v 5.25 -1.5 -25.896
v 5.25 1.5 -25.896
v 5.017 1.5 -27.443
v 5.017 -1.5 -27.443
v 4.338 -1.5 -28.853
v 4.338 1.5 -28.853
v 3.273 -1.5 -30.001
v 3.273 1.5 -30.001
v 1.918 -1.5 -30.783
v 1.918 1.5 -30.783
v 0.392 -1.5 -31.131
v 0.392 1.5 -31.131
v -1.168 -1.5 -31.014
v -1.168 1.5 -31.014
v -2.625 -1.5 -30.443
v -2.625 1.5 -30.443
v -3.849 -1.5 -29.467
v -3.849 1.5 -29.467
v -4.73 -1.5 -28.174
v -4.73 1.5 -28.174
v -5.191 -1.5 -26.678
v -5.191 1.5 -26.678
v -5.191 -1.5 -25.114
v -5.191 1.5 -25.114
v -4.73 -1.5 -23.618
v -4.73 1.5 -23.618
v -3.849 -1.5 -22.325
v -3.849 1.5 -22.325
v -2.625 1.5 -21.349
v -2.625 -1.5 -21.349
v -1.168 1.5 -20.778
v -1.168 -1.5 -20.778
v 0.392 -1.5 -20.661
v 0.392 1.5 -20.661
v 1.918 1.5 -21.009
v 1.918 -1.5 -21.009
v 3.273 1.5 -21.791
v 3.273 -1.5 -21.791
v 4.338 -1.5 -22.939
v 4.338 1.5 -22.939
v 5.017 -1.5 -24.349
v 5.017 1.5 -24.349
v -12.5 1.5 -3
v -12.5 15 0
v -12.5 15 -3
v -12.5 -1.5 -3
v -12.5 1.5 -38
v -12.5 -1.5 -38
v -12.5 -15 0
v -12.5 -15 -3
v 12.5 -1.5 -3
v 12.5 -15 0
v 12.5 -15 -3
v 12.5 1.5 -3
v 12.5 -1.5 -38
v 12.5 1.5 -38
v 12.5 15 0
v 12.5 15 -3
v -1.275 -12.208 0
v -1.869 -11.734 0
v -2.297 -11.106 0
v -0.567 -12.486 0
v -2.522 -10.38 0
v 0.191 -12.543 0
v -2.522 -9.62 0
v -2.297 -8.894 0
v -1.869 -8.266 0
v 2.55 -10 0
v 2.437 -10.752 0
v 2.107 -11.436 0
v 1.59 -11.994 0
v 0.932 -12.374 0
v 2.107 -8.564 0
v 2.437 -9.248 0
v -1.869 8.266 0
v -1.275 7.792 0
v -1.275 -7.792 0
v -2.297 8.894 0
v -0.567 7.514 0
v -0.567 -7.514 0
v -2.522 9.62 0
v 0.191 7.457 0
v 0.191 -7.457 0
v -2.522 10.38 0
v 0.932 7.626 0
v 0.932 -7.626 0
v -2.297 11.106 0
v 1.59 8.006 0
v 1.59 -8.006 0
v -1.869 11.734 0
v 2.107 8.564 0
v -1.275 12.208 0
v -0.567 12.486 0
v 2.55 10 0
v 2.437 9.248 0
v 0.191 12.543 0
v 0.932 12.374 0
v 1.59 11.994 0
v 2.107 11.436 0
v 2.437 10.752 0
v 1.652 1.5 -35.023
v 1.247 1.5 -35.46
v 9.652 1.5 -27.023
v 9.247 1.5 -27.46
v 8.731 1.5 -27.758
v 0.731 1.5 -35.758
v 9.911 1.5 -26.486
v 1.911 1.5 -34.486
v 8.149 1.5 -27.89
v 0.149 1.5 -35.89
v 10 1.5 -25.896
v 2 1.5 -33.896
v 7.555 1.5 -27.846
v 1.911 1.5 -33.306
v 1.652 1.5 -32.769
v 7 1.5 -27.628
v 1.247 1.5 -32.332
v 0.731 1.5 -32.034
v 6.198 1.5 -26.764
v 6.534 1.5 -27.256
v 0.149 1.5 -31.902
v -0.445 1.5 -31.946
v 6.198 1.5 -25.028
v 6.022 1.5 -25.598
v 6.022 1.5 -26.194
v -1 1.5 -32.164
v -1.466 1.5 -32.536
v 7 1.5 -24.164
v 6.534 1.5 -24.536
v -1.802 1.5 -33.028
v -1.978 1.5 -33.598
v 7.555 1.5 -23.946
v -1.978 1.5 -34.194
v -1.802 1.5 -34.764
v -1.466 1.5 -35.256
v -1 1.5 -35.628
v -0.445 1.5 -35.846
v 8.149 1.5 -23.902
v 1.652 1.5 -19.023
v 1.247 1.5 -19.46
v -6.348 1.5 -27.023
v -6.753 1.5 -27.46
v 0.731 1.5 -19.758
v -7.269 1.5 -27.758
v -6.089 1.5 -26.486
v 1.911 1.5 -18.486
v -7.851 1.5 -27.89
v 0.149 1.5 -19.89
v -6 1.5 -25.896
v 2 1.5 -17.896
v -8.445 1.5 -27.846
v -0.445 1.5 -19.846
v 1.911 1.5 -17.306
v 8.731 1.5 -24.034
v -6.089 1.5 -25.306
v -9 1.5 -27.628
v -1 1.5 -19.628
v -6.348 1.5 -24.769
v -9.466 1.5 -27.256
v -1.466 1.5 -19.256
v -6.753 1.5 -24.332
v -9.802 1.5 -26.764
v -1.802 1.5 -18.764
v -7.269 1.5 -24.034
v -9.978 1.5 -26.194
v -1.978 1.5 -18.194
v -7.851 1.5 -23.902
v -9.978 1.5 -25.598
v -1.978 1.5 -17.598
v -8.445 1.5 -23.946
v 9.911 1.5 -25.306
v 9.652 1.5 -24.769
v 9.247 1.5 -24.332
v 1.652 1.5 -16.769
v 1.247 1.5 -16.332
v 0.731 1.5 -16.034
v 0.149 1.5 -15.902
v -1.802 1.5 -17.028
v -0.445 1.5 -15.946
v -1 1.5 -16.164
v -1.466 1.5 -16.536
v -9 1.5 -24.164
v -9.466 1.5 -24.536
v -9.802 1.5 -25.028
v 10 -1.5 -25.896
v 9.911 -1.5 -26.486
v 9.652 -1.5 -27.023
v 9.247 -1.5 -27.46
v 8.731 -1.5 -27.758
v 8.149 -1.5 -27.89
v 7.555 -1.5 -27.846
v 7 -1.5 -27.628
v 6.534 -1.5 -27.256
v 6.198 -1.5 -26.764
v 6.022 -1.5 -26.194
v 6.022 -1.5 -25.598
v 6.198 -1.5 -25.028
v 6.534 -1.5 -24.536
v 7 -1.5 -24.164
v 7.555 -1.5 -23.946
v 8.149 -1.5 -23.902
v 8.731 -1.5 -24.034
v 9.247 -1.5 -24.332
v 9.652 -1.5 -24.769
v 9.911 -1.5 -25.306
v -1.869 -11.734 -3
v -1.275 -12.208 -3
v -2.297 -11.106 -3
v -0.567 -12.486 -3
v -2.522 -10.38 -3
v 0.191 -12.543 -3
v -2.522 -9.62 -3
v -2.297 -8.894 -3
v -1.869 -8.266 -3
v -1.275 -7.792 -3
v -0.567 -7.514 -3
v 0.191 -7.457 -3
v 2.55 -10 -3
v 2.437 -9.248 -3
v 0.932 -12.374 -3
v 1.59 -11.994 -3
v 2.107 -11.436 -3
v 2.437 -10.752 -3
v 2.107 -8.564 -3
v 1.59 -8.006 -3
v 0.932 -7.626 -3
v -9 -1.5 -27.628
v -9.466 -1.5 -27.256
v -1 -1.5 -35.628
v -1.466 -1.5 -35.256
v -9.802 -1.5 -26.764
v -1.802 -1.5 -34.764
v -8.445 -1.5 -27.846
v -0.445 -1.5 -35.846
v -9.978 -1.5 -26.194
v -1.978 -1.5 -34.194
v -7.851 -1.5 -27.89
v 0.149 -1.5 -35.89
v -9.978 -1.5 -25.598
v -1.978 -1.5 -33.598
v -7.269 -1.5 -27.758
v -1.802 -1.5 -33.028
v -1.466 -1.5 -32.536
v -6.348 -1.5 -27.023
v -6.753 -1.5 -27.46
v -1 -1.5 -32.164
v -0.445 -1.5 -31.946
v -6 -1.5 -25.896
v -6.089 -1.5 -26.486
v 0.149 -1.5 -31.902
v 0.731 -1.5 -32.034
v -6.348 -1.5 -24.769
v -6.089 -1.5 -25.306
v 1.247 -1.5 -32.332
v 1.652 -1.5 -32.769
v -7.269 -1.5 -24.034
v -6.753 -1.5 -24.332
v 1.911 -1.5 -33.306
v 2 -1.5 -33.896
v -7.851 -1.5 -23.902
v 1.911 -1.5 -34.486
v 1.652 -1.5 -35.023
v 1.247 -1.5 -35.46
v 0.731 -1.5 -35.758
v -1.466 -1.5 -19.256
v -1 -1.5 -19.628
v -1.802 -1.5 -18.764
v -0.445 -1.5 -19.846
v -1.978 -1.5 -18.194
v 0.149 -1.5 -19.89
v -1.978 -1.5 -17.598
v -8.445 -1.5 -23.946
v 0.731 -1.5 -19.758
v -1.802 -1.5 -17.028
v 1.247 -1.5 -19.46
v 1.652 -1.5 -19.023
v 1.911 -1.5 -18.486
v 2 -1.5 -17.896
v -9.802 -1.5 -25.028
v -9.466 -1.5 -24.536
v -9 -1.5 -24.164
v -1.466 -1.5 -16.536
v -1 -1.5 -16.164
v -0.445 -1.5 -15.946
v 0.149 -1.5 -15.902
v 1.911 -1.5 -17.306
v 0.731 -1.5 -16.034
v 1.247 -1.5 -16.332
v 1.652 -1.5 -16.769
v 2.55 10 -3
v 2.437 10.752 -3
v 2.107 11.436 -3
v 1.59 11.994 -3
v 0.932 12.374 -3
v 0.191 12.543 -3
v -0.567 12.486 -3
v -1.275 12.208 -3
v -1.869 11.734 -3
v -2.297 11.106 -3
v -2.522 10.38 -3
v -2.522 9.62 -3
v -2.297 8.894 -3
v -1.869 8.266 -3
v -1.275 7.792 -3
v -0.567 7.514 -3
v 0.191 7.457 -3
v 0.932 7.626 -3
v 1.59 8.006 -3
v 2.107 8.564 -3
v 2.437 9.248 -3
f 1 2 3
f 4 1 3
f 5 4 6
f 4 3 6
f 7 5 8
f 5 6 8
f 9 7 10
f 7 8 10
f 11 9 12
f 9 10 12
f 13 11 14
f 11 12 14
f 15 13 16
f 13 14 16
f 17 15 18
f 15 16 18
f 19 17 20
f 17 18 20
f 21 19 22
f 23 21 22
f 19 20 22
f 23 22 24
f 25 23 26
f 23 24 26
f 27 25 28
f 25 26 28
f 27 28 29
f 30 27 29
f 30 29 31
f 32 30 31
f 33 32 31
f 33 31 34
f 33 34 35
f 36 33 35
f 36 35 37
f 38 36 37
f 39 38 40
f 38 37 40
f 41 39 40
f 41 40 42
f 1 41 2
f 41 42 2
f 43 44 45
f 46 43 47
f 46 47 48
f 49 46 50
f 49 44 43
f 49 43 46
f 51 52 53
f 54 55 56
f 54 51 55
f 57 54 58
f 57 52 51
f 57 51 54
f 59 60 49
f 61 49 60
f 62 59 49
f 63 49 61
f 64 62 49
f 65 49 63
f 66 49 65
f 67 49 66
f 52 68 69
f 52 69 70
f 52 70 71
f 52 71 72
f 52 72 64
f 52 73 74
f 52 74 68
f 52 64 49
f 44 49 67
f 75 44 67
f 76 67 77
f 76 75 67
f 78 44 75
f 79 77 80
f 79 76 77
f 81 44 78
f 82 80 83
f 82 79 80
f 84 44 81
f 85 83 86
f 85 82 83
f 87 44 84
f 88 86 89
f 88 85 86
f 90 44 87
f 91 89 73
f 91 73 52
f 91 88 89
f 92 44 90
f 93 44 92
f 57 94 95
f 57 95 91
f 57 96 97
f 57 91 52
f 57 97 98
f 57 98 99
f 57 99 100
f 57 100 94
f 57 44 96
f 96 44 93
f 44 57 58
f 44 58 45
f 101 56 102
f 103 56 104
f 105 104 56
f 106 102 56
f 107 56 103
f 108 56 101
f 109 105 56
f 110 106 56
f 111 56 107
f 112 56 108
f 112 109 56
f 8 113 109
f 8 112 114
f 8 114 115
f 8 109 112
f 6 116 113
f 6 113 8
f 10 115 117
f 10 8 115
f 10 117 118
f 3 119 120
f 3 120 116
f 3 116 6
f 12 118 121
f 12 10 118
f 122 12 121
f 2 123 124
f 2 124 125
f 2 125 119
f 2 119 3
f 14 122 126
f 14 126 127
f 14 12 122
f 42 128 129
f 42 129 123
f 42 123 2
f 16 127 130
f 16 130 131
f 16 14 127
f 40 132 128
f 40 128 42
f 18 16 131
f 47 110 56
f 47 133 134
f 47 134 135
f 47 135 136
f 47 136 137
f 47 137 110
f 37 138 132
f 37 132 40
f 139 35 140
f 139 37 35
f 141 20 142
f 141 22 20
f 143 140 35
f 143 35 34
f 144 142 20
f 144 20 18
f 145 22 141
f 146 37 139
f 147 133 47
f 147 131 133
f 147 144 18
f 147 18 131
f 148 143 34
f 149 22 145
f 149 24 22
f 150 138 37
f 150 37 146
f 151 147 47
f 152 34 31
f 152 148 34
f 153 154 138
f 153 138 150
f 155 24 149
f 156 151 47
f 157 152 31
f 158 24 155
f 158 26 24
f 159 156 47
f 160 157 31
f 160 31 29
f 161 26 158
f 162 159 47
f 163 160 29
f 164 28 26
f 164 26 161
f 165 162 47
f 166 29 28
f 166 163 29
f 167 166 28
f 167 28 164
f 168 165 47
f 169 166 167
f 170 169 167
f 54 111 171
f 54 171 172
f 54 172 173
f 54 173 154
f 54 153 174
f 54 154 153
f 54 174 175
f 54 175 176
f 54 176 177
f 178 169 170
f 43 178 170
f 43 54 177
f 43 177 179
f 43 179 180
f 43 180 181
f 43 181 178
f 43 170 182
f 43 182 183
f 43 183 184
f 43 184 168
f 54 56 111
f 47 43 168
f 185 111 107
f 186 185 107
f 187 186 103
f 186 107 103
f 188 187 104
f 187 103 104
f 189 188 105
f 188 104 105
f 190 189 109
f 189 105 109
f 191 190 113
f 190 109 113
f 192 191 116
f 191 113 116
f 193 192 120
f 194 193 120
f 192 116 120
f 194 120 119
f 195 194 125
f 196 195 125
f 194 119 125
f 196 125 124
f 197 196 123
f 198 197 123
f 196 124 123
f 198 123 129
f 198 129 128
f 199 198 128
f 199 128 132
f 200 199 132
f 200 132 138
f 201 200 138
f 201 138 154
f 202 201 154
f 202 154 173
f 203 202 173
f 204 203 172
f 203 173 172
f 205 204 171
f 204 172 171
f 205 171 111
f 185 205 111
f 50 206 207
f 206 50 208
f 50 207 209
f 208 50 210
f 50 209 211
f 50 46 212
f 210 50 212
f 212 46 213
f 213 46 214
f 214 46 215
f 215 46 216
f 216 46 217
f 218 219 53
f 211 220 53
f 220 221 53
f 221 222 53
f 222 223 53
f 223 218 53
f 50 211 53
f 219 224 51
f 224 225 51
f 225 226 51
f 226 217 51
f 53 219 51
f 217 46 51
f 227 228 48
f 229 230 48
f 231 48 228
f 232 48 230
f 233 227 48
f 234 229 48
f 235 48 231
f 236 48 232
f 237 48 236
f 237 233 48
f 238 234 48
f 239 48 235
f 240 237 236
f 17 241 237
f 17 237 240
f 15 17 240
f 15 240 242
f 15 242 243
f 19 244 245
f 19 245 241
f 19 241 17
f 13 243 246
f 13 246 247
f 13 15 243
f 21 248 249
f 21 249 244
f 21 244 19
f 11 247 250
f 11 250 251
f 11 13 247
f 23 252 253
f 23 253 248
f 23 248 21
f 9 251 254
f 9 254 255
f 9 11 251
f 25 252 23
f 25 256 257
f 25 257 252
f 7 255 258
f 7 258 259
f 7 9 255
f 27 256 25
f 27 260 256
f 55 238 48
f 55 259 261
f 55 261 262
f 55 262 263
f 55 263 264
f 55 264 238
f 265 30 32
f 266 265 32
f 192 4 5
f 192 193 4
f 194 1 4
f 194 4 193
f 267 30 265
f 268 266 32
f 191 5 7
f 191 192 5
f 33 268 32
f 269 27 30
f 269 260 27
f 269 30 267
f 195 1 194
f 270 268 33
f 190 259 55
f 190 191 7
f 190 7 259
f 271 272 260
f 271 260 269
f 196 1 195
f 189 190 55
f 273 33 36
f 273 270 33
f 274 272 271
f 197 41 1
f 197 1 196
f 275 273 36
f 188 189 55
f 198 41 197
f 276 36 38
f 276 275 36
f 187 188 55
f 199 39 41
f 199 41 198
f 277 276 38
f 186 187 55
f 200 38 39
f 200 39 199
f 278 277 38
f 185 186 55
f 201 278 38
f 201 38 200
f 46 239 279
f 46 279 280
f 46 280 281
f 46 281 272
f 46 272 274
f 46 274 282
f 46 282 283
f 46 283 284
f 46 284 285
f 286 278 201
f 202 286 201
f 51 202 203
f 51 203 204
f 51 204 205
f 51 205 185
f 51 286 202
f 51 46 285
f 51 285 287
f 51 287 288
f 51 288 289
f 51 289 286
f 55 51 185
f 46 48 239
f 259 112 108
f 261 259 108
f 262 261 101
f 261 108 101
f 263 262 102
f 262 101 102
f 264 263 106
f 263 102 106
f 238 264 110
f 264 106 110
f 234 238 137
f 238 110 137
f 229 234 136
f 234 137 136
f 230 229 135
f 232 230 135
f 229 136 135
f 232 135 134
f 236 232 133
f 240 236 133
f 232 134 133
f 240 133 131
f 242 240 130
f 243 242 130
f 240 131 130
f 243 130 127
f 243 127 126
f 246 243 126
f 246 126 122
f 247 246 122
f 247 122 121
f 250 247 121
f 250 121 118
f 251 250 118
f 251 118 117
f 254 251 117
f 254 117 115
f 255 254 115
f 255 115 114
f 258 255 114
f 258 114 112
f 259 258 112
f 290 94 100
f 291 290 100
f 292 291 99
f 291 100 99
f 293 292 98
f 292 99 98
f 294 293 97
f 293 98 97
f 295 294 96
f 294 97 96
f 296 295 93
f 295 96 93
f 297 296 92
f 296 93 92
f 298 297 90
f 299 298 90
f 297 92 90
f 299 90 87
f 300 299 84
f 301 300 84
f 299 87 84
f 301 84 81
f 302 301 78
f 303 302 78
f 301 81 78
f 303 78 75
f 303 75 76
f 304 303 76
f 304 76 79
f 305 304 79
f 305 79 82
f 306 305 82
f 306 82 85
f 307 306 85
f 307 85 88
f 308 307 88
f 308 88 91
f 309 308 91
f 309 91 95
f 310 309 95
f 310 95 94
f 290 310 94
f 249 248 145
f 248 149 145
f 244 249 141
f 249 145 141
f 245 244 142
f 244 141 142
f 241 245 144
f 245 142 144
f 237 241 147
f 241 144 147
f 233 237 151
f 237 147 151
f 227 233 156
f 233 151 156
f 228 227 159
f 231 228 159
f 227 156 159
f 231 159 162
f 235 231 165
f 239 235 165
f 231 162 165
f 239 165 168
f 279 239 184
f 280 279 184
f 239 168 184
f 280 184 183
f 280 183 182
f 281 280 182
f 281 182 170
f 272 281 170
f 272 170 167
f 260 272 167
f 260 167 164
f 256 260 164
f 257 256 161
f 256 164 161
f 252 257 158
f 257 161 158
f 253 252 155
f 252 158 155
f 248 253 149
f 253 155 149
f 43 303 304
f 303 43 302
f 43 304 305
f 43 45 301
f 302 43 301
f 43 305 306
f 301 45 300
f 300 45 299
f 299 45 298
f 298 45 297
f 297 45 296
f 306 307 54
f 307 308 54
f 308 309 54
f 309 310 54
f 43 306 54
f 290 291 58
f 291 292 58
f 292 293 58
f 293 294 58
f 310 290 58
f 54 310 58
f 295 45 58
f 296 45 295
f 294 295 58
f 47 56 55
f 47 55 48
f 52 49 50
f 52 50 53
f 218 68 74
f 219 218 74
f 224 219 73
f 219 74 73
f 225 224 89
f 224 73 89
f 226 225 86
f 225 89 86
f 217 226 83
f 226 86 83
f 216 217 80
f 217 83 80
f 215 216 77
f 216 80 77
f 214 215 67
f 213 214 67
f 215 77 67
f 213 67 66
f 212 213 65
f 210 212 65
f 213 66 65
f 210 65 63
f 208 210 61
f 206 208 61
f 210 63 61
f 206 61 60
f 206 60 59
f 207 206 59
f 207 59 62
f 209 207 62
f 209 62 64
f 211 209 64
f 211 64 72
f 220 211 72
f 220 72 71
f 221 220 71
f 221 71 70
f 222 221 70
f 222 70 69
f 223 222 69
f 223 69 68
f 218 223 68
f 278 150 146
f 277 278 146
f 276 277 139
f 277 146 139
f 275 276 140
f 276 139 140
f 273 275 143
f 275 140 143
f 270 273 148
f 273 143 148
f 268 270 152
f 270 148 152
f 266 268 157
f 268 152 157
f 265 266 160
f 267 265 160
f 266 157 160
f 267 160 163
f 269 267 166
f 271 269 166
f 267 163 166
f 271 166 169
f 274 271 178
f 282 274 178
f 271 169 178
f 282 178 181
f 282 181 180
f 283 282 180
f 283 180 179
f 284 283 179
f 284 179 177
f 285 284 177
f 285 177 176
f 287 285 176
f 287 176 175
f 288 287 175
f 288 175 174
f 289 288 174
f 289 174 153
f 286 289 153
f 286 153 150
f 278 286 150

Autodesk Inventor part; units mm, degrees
ref_plane "YZ Plane" through (0, 0, 0) normal (1, 0, 0) x (0, 1, 0)
ref_plane "XZ Plane" through (0, 0, 0) normal (0, 1, 0) x (-1, 0, 0)
ref_plane "XY Plane" through (0, 0, 0) normal (0, 0, 1) x (1, 0, 0)
sketch "Sketch1" plane through (0, 0, 0) normal (0, 0, 1) x (1, 0, 0)
  line L0 (12.5, 15) -> (-12.5, 15)
  line L1 (-12.5, 15) -> (-12.5, -15)
  line L2 (-12.5, -15) -> (12.5, -15)
  line L3 (12.5, -15) -> (12.5, 15)
  line L4 (12.5, 15) -> (-12.5, -15) construction
  line L5 (-12.5, 15) -> (12.5, -15) construction
  point P0 (0, 0)
  dimension "d0" = 25
  dimension "d1" = 30
extrude "Extrusion1" add sketch "Sketch1" against normal blind 3
sketch "Sketch2" plane through (0, 0, -3) normal (0, 0, -1) x (-1, 0, 0)
  line L0 (12.5, -15) -> (12.5, 15) projected
  line L1 (-12.5, 1.5) -> (12.5, 1.5)
  line L2 (12.5, 1.5) -> (12.5, -1.5)
  line L3 (12.5, -1.5) -> (-12.5, -1.5)
  line L4 (-12.5, -1.5) -> (-12.5, 1.5)
  line L5 (-12.5, 1.5) -> (12.5, -1.5) construction
  line L6 (12.5, 1.5) -> (-12.5, -1.5) construction
  point P0 (0, 0)
  dimension "d4" = 3
extrude "Extrusion2" add sketch "Sketch2" along normal blind 35
sketch "Sketch3" plane through (0, 0, 0) normal (0, 0, 1) x (1, 0, 0)
  line L0 (0, 10) -> (0, -10)
  circle A0 centre (0, 10) radius 2.55
  circle A1 centre (0, -10) radius 2.55
  point P0 (0, 0)
  dimension "d7" = 20
  dimension "d8" = 5.1
  dimension "d9" = 5.1
extrude "Extrusion3" cut sketch "Sketch3" against normal through all
sketch "Sketch4" plane through (-12.5, 1.5, -3) normal (0, 1, 0) x (1, 0, 0)
  line L0 (9.95, 0) -> (15.05, 0) projected
  line L1 (12.5, 0) -> (12.5, 22.896)
  circle A0 centre (12.5, 22.896) radius 5.25
  circle A1 centre (12.5, 22.896) radius 8
  circle A2 centre (12.5, 14.896) radius 2
  circle A3 centre (20.5, 22.896) radius 2
  circle A4 centre (12.5, 30.896) radius 2
  circle A5 centre (4.5, 22.896) radius 2
  point P0 (12.5, -3)
  dimension "d14" = 16
  dimension "d12" = 22.896
  dimension "d13" = 10.5
  dimension "d15" = 4
  dimension "d18" = 360
extrude "Extrusion4" cut sketch "Sketch4" against normal through all contours A2 A1 L1 | L1 A1 A2 | A1 A2 L1 | L1 A2 A1 | A0 | A5 A1 | A1 A5 | A3 A1 | A1 A3 | A4 A1 | A1 A4
properties part number "LeadCarriageConnector"
